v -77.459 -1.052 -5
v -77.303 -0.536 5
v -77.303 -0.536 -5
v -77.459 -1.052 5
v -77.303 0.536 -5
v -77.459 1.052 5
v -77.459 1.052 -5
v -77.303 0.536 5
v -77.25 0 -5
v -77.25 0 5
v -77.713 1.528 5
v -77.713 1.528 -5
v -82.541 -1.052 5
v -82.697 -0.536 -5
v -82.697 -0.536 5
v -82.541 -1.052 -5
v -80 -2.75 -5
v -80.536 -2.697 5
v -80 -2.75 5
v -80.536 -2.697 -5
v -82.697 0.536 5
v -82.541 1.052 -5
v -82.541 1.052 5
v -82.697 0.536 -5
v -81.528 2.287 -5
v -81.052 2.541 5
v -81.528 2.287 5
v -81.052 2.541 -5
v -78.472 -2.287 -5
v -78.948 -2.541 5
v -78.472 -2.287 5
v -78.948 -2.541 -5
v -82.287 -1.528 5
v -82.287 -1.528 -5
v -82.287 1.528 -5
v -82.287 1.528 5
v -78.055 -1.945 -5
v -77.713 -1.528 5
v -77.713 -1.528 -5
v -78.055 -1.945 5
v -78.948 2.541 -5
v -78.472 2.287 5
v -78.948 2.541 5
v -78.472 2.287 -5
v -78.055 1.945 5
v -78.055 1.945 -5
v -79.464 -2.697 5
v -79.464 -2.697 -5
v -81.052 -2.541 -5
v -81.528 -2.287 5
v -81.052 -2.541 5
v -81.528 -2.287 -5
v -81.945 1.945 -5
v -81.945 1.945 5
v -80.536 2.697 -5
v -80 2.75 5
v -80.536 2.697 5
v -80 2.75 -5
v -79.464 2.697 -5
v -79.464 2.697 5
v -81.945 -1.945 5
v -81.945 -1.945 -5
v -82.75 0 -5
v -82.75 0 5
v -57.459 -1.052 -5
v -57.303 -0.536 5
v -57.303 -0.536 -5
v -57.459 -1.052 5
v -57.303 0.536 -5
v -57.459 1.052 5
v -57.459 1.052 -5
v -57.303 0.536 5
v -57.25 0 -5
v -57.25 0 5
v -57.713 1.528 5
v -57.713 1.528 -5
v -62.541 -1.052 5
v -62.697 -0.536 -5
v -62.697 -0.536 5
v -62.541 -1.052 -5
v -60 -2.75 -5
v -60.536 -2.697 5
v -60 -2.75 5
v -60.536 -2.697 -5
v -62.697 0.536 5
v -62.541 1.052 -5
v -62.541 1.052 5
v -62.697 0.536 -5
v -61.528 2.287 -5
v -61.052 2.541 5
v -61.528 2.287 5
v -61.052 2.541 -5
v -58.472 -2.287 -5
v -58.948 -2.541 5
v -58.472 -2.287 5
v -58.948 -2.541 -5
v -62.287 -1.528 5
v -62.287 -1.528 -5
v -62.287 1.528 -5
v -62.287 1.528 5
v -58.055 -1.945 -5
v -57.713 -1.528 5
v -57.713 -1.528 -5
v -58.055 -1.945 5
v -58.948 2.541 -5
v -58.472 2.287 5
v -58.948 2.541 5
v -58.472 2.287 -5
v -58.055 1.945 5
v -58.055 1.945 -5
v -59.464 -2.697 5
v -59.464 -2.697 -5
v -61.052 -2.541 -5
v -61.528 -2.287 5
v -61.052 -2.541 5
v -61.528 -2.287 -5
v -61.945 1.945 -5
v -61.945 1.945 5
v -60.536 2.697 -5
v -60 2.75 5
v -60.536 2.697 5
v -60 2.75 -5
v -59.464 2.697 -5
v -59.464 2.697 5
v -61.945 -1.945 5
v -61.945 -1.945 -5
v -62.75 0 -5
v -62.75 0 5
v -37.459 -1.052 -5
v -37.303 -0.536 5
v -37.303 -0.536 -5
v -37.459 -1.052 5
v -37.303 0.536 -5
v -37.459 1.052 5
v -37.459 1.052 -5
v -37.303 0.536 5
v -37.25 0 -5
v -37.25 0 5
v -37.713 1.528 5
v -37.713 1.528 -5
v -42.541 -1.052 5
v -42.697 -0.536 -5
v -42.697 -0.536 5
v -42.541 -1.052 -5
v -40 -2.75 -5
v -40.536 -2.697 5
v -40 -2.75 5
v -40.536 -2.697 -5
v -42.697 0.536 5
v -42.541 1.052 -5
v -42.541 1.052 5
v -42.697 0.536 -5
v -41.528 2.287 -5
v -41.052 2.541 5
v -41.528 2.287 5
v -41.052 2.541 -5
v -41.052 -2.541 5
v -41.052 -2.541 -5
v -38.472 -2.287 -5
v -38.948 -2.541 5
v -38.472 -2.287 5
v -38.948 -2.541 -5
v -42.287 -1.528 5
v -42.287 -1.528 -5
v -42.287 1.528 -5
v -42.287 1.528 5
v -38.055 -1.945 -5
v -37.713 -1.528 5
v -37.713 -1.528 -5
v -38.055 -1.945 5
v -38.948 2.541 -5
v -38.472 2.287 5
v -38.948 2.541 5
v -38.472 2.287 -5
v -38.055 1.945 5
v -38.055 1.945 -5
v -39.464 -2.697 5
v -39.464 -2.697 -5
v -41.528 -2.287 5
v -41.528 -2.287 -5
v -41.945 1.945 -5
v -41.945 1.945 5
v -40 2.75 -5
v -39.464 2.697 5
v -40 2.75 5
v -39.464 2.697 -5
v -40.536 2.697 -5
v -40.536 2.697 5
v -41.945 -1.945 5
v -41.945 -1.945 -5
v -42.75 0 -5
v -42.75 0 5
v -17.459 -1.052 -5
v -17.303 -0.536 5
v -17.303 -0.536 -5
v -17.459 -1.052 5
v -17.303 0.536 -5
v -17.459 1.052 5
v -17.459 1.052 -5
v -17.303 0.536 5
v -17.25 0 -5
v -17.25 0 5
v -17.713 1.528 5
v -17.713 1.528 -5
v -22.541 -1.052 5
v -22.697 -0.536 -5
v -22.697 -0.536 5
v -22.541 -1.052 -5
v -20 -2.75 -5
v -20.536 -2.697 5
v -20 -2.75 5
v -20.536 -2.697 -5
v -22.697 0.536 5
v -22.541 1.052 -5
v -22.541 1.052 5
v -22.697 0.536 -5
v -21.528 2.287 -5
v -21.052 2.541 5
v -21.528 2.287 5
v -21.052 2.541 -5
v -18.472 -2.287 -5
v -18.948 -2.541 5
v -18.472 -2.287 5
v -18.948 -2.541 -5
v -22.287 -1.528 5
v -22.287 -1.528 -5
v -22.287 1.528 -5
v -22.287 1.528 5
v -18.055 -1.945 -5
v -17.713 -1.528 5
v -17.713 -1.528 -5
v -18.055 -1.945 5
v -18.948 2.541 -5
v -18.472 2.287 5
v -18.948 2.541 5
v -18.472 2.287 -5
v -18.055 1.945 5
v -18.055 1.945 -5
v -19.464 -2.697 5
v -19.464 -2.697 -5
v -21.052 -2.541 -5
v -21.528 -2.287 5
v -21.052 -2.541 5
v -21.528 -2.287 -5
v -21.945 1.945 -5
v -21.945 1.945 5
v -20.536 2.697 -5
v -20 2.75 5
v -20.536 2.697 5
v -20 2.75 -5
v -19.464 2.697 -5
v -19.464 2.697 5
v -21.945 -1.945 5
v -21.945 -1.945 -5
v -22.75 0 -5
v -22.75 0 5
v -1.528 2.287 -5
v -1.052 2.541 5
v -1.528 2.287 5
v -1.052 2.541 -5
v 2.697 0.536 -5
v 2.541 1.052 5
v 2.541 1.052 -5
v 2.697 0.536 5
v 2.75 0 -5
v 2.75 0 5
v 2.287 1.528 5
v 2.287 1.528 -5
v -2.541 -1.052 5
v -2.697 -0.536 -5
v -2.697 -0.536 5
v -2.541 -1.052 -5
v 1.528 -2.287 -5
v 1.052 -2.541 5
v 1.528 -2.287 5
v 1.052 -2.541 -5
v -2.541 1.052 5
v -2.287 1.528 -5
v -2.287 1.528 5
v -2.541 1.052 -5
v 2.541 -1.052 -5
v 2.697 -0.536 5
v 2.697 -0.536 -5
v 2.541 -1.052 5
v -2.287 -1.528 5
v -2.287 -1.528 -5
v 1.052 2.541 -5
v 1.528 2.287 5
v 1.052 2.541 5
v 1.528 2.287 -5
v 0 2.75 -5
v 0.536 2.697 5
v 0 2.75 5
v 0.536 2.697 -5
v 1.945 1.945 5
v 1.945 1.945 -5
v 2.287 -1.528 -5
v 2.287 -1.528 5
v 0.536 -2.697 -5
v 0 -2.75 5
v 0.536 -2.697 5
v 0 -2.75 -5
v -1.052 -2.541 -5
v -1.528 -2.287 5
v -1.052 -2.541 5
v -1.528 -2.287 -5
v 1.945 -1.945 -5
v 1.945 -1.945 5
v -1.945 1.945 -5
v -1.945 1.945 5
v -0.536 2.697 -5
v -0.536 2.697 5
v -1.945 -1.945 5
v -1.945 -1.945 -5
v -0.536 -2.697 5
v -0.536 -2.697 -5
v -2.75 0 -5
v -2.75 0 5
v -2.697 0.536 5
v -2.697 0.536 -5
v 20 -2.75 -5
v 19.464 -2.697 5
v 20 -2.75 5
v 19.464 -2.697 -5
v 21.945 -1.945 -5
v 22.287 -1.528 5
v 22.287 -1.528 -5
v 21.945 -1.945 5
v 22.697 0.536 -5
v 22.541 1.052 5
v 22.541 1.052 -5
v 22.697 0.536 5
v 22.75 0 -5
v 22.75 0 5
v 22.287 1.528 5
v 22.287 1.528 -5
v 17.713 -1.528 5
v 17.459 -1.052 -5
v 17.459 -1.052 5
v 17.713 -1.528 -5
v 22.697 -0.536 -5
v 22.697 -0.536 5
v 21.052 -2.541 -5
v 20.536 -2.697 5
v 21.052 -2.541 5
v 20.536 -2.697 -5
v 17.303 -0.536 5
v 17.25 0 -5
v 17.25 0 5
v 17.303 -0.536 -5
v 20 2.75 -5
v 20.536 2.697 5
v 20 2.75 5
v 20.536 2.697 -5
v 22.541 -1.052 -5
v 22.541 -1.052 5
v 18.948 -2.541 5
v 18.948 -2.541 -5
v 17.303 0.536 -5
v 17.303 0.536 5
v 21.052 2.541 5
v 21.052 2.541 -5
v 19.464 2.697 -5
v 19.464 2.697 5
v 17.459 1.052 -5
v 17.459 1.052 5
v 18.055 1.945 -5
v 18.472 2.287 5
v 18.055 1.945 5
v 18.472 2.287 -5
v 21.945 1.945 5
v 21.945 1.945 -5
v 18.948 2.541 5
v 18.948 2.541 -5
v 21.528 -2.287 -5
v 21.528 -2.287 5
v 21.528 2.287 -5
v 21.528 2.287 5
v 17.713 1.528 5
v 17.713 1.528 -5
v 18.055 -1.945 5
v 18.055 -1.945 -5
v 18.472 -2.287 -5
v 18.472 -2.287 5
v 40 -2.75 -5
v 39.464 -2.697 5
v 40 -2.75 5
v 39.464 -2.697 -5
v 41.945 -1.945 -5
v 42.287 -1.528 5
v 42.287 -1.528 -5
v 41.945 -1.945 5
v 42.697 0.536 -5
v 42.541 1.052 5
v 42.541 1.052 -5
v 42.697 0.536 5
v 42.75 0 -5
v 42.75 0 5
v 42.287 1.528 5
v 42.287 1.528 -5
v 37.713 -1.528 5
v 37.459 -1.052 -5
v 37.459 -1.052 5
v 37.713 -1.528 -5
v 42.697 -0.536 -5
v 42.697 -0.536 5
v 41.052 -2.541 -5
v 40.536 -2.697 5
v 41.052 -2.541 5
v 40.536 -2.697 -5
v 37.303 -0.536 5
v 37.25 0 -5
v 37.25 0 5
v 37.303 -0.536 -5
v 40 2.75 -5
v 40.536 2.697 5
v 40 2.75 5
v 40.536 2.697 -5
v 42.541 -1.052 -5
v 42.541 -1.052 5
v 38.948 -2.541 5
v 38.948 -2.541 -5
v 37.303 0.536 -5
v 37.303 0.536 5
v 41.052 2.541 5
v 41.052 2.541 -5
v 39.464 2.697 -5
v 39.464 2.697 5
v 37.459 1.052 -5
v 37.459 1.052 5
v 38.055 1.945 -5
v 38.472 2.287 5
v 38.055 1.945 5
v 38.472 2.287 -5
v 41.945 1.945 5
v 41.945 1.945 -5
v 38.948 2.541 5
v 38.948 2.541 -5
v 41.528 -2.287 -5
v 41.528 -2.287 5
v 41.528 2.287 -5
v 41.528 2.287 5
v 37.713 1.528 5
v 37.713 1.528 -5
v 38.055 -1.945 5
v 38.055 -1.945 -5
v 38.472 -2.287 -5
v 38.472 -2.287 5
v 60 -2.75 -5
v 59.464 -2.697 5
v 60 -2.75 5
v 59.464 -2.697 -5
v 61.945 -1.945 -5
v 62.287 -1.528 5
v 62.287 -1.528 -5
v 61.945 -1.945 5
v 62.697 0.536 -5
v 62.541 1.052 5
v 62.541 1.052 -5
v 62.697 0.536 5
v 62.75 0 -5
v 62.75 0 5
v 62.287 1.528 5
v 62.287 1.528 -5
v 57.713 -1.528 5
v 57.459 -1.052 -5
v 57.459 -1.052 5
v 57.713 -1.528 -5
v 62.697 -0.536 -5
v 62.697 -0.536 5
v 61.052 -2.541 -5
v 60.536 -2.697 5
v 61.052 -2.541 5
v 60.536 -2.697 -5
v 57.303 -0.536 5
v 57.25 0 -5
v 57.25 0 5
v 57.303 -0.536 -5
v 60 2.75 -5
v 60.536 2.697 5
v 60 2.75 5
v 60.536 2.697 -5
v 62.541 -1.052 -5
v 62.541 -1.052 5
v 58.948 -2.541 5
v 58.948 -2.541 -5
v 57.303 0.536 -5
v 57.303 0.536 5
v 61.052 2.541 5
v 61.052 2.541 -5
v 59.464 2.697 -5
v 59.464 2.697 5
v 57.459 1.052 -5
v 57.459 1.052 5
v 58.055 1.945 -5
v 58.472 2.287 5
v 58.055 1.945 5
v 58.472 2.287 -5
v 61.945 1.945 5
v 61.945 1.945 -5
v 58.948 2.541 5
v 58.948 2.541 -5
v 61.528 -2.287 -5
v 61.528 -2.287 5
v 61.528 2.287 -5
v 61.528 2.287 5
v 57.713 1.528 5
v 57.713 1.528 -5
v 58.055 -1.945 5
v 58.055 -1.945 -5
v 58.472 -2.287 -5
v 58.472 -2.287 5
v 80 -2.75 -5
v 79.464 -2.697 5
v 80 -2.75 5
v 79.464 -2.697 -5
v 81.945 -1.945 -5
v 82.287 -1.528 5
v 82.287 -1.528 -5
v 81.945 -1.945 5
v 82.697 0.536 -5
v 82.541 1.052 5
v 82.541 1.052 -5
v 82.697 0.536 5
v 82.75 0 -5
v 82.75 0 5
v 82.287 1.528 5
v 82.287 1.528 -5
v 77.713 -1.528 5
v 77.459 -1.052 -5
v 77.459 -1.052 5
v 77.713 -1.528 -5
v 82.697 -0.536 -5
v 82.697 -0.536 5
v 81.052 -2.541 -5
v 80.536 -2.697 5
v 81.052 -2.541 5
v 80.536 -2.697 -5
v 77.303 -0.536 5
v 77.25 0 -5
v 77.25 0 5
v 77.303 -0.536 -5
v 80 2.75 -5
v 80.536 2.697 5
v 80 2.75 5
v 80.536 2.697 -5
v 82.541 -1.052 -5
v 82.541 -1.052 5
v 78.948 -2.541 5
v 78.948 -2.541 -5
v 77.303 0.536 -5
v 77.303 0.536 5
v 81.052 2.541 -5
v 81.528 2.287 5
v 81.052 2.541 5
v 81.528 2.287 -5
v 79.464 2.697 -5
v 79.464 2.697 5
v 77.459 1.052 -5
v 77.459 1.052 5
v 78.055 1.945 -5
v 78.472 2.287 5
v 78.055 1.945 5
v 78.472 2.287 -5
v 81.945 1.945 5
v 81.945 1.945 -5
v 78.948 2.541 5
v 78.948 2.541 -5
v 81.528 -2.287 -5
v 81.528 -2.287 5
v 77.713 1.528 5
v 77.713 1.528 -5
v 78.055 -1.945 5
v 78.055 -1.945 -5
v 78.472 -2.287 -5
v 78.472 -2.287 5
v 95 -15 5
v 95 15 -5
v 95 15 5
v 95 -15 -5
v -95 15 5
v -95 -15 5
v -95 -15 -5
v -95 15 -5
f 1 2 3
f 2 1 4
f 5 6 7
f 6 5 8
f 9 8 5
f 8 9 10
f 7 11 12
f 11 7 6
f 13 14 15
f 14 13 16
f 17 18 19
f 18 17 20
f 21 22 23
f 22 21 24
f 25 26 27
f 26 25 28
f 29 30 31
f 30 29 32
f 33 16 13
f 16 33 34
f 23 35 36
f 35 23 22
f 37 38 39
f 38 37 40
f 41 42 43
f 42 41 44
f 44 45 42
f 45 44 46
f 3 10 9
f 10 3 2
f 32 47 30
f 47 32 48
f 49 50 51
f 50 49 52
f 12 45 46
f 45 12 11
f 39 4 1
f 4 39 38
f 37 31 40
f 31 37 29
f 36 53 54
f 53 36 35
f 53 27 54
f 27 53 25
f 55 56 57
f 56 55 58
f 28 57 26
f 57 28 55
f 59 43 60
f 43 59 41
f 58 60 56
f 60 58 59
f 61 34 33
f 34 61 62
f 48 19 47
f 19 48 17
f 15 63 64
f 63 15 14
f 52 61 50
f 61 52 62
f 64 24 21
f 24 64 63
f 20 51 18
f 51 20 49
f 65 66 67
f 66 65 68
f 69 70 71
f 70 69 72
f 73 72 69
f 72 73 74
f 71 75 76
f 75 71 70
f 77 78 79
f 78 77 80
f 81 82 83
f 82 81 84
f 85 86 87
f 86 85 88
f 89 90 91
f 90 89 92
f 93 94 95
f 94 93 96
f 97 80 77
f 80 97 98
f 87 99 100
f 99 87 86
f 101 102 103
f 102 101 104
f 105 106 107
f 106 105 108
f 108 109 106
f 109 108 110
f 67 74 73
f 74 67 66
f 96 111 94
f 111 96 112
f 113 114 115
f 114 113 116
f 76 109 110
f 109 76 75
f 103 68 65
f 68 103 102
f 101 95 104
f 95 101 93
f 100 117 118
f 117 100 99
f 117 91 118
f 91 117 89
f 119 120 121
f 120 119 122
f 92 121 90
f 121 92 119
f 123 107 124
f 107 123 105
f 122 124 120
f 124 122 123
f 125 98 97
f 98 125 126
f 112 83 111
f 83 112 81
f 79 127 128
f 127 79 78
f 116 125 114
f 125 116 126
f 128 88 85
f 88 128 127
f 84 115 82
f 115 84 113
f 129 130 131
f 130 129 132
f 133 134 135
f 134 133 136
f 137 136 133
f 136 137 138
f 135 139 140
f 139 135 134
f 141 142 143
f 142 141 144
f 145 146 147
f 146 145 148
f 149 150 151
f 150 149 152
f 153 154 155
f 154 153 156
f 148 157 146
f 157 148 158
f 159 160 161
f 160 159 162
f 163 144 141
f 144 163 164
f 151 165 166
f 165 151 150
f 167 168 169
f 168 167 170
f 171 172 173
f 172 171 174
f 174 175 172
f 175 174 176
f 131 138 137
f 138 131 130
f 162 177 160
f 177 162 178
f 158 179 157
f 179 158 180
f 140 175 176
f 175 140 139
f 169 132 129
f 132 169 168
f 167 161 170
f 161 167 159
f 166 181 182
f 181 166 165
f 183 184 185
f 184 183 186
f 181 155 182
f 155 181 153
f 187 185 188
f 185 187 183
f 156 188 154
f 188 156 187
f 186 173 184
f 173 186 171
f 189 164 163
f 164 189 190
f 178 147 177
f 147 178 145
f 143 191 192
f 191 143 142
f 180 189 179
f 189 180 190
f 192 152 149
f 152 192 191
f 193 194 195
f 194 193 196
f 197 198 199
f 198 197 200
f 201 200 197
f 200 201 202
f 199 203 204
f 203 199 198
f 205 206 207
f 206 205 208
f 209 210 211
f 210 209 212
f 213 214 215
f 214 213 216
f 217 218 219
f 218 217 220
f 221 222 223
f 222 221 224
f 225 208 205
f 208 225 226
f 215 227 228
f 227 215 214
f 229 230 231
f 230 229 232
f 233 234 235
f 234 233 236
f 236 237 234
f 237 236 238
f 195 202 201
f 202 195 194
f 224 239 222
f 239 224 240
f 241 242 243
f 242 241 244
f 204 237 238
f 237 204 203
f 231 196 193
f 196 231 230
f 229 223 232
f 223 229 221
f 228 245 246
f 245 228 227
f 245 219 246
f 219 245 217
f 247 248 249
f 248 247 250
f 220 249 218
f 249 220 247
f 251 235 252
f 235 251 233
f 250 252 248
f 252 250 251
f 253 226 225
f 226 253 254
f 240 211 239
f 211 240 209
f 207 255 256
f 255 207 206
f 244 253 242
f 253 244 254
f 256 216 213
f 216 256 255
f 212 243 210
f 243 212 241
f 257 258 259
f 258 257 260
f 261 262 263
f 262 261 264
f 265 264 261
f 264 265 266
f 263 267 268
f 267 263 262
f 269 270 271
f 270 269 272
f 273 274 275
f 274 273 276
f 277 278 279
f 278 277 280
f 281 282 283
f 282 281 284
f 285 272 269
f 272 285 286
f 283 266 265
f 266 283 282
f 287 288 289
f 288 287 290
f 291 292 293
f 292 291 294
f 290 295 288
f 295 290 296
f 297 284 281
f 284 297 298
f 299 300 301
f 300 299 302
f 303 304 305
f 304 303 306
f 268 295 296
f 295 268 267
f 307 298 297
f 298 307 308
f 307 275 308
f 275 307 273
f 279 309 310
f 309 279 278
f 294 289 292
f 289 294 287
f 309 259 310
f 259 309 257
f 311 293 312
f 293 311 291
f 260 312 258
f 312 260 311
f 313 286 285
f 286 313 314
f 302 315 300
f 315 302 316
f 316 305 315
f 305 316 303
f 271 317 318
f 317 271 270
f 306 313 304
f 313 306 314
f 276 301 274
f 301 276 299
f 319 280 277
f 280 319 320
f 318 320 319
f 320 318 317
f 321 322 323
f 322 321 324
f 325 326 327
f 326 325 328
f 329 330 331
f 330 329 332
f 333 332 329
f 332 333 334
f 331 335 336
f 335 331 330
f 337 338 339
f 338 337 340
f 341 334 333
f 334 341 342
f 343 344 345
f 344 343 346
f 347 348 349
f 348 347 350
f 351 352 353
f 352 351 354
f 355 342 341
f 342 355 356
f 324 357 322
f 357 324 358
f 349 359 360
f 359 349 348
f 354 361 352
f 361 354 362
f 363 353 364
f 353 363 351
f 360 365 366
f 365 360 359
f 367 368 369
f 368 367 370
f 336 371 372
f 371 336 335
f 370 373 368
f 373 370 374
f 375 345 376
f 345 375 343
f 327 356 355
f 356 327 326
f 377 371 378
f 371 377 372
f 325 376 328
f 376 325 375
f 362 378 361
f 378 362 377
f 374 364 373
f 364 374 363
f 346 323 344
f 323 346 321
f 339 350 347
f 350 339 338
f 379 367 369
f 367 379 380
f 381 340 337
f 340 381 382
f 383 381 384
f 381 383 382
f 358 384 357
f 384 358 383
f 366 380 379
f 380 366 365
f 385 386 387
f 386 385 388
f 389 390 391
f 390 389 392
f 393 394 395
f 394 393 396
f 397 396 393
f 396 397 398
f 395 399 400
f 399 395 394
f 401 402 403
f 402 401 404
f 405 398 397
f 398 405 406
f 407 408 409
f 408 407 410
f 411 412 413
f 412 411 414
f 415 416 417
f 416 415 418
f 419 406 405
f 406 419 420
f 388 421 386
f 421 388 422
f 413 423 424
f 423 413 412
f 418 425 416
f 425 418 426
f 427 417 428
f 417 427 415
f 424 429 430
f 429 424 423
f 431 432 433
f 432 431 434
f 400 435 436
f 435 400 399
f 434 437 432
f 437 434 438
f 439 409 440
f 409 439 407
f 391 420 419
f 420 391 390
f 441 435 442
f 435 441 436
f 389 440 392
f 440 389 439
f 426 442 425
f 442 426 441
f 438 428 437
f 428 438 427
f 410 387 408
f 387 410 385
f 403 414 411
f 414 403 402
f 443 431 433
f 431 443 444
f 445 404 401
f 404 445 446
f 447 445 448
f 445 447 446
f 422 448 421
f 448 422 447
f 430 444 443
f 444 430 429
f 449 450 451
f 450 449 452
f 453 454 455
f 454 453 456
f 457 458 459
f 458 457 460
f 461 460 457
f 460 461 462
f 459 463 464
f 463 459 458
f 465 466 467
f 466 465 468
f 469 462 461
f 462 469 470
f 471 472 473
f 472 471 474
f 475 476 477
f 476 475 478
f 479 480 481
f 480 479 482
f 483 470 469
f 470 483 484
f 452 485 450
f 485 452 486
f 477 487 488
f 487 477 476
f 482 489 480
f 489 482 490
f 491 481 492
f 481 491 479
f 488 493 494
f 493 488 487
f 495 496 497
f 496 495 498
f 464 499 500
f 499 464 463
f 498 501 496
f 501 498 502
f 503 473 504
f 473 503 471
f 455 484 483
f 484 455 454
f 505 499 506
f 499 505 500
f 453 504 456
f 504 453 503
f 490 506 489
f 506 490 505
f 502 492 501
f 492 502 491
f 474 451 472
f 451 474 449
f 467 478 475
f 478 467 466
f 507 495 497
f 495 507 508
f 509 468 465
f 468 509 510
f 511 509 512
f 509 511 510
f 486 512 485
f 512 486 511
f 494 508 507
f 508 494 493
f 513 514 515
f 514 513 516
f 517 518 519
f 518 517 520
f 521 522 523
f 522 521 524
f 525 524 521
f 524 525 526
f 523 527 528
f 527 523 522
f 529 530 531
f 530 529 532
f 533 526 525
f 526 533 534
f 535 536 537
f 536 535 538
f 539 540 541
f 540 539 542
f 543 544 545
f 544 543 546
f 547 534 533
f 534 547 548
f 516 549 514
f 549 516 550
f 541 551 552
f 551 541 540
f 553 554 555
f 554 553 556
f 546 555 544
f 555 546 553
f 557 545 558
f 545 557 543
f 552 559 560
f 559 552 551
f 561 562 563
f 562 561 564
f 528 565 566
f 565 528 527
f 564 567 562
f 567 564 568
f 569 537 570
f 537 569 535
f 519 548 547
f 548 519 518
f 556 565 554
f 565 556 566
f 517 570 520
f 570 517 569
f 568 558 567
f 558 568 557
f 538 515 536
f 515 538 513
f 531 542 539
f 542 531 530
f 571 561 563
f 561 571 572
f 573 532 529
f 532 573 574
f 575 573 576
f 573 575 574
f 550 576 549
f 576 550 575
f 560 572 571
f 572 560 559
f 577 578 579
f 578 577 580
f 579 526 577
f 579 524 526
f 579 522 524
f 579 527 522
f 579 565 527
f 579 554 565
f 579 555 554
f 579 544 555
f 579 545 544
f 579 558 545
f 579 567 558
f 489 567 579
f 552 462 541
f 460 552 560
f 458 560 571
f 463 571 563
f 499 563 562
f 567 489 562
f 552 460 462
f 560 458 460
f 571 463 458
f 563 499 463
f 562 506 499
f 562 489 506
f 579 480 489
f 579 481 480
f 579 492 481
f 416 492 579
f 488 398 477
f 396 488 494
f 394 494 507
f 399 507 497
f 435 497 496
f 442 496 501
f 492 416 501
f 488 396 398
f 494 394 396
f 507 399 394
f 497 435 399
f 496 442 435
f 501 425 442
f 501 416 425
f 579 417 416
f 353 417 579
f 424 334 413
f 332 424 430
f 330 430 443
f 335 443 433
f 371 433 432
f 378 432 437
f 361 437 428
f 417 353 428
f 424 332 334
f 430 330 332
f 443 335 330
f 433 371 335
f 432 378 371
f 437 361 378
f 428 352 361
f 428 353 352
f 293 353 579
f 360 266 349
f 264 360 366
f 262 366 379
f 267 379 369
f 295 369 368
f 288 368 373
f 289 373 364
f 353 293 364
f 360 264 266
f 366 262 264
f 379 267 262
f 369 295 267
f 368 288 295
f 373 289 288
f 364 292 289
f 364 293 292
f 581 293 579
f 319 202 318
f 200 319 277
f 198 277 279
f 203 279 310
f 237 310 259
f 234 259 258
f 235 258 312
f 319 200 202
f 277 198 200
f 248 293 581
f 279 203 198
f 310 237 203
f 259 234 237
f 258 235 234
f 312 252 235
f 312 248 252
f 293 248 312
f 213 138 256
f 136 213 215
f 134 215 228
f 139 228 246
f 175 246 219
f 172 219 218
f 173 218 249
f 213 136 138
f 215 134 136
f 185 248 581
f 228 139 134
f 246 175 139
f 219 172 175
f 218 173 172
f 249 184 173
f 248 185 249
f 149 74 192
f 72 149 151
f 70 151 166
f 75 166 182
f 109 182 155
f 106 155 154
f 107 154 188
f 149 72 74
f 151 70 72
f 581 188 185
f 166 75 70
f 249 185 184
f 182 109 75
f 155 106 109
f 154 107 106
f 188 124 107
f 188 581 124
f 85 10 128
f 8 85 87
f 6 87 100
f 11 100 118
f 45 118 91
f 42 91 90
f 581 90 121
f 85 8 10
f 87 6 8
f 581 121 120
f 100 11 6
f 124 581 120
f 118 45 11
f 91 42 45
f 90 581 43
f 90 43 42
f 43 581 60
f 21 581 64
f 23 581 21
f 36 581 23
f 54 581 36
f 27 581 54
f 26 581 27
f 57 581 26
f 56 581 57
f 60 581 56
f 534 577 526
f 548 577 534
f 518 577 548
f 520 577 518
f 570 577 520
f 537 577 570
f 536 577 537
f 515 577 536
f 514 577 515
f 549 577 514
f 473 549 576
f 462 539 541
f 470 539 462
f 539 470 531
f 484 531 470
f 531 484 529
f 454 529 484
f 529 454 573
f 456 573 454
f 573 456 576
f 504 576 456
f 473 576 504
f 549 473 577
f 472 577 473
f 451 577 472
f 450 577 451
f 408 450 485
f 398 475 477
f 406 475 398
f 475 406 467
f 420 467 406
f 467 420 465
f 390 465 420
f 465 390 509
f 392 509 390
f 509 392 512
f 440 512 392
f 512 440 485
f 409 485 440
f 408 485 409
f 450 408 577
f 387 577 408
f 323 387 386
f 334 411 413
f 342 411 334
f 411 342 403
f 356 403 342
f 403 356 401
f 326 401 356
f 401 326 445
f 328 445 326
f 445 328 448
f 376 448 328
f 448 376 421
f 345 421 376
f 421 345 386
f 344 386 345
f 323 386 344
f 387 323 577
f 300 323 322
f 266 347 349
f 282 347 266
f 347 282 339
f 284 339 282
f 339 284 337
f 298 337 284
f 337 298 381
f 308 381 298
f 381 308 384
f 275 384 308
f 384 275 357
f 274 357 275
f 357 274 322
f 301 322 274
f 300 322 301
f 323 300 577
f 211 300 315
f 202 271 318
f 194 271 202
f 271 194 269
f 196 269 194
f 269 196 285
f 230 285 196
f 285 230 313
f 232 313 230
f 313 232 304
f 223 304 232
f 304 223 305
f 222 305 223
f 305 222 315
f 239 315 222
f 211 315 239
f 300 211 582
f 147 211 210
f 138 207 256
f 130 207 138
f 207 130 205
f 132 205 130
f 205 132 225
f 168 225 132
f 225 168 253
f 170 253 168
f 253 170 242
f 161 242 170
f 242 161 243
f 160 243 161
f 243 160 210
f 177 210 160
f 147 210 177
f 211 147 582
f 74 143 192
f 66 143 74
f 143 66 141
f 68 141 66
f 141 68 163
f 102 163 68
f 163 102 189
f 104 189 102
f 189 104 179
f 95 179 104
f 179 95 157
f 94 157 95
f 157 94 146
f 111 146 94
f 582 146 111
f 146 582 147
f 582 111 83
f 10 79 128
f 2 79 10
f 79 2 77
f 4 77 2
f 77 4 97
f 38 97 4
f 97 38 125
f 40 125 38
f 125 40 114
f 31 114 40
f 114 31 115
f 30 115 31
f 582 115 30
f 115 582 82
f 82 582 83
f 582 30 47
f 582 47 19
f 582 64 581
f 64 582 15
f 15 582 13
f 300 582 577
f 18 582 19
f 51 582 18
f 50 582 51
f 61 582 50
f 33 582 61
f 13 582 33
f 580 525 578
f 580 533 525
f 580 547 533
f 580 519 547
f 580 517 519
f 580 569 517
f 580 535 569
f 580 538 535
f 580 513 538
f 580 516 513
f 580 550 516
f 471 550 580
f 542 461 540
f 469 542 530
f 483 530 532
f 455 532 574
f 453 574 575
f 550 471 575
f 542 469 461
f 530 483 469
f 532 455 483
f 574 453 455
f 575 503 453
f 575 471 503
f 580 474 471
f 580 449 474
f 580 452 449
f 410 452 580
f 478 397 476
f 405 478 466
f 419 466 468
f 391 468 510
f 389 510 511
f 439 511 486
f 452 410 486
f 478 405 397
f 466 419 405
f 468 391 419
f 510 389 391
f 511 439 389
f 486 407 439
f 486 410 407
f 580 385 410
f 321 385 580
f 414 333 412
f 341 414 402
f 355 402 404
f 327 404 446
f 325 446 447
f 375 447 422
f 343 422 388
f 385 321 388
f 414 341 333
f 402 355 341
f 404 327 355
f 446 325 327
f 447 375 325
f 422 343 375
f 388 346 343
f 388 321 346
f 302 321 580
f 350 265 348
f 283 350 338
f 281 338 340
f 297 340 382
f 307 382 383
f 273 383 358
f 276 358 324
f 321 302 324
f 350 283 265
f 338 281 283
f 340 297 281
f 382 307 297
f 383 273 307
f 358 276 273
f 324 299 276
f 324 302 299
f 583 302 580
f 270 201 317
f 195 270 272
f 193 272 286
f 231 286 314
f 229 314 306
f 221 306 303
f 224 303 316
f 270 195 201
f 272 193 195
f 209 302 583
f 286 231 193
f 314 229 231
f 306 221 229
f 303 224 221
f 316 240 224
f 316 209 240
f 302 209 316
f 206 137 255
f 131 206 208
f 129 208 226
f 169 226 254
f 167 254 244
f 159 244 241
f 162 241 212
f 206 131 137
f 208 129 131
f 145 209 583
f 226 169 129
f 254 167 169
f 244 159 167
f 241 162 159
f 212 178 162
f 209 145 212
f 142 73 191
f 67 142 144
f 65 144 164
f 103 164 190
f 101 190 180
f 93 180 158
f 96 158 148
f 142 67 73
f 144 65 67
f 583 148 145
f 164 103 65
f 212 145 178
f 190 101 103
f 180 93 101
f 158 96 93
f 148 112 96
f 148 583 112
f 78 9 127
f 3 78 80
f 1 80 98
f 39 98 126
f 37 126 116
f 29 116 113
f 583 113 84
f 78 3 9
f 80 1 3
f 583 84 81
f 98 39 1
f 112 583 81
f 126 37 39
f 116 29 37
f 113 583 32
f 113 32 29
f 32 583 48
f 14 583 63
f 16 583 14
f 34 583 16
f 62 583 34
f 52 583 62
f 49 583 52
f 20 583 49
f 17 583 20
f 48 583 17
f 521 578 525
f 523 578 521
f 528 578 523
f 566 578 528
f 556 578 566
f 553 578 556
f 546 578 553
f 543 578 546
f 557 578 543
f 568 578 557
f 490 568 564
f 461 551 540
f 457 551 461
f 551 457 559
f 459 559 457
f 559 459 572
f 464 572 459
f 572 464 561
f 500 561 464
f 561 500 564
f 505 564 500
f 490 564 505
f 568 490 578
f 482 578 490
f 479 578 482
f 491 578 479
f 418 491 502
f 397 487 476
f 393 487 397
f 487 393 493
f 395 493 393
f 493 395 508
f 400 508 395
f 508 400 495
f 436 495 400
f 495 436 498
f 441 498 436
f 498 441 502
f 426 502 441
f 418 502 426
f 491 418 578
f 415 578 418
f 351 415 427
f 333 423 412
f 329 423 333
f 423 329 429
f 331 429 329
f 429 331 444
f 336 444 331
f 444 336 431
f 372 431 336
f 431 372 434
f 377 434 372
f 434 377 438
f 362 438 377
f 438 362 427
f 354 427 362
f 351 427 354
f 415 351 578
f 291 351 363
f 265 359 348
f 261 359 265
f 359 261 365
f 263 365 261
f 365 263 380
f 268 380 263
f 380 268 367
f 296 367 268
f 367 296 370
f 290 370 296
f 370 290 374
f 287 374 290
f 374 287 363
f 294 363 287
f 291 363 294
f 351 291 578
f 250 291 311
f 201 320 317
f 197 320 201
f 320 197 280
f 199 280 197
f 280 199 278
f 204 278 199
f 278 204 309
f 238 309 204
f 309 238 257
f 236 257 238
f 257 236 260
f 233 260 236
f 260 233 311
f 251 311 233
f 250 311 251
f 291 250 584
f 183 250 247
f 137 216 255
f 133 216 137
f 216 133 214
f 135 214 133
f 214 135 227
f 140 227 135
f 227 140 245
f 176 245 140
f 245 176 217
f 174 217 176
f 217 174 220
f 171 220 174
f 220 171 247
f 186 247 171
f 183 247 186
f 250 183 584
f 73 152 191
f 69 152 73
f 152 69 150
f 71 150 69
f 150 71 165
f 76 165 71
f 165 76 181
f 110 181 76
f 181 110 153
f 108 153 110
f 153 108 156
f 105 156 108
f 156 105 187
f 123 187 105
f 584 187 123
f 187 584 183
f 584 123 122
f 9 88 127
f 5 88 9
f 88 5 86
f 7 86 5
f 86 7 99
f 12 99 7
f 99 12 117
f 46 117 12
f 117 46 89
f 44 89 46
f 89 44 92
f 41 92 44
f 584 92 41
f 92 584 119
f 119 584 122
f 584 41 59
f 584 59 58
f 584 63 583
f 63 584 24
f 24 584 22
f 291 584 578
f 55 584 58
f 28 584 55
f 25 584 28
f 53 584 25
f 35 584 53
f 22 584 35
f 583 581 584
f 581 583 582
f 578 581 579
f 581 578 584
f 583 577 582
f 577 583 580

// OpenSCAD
$fn = 32;

// ----------------------------------------------------------------------
// Hole bar, 9 x Ø5.5
// skip layout, 15 mm edge offset
// ----------------------------------------------------------------------

// --- parameters (mm) ---
bar_w = 30;       // bar width (Y)
bar_t = 10;       // bar thickness (Z)
holes = 9;        // holes per row
hole_d = 5.5;     // hole diameter
edge = 15;        // offset from the bar end to the first hole
grid_pitch = 10;  // grid the bar was laid out on

// --- derived feature positions (mm) ---
pitch = grid_pitch * 2;       // = 20   holes sit every other grid slot
span = (holes - 1) * pitch;   // = 160   distance between the end holes
bar_l = span + 2 * edge;      // = 190   overall bar length
start_x = -bar_l / 2 + edge;  // = -80   X of the first hole
feature_centers = [
  [start_x + 0 * pitch, 0],
  [start_x + 1 * pitch, 0],
  [start_x + 2 * pitch, 0],
  [start_x + 3 * pitch, 0],
  [start_x + 4 * pitch, 0],
  [start_x + 5 * pitch, 0],
  [start_x + 6 * pitch, 0],
  [start_x + 7 * pitch, 0],
  [start_x + 8 * pitch, 0]
];   // hole centres of the first row

// bar with one row of holes, drilled from feature_centers
difference() {
  translate([-bar_l / 2, -bar_w / 2, -bar_t / 2]) cube([bar_l, bar_w, bar_t]);
  for (centre = feature_centers)
    translate([centre[0], centre[1], 0])
      cylinder(d = hole_d, h = bar_t + 2, center = true);
}
